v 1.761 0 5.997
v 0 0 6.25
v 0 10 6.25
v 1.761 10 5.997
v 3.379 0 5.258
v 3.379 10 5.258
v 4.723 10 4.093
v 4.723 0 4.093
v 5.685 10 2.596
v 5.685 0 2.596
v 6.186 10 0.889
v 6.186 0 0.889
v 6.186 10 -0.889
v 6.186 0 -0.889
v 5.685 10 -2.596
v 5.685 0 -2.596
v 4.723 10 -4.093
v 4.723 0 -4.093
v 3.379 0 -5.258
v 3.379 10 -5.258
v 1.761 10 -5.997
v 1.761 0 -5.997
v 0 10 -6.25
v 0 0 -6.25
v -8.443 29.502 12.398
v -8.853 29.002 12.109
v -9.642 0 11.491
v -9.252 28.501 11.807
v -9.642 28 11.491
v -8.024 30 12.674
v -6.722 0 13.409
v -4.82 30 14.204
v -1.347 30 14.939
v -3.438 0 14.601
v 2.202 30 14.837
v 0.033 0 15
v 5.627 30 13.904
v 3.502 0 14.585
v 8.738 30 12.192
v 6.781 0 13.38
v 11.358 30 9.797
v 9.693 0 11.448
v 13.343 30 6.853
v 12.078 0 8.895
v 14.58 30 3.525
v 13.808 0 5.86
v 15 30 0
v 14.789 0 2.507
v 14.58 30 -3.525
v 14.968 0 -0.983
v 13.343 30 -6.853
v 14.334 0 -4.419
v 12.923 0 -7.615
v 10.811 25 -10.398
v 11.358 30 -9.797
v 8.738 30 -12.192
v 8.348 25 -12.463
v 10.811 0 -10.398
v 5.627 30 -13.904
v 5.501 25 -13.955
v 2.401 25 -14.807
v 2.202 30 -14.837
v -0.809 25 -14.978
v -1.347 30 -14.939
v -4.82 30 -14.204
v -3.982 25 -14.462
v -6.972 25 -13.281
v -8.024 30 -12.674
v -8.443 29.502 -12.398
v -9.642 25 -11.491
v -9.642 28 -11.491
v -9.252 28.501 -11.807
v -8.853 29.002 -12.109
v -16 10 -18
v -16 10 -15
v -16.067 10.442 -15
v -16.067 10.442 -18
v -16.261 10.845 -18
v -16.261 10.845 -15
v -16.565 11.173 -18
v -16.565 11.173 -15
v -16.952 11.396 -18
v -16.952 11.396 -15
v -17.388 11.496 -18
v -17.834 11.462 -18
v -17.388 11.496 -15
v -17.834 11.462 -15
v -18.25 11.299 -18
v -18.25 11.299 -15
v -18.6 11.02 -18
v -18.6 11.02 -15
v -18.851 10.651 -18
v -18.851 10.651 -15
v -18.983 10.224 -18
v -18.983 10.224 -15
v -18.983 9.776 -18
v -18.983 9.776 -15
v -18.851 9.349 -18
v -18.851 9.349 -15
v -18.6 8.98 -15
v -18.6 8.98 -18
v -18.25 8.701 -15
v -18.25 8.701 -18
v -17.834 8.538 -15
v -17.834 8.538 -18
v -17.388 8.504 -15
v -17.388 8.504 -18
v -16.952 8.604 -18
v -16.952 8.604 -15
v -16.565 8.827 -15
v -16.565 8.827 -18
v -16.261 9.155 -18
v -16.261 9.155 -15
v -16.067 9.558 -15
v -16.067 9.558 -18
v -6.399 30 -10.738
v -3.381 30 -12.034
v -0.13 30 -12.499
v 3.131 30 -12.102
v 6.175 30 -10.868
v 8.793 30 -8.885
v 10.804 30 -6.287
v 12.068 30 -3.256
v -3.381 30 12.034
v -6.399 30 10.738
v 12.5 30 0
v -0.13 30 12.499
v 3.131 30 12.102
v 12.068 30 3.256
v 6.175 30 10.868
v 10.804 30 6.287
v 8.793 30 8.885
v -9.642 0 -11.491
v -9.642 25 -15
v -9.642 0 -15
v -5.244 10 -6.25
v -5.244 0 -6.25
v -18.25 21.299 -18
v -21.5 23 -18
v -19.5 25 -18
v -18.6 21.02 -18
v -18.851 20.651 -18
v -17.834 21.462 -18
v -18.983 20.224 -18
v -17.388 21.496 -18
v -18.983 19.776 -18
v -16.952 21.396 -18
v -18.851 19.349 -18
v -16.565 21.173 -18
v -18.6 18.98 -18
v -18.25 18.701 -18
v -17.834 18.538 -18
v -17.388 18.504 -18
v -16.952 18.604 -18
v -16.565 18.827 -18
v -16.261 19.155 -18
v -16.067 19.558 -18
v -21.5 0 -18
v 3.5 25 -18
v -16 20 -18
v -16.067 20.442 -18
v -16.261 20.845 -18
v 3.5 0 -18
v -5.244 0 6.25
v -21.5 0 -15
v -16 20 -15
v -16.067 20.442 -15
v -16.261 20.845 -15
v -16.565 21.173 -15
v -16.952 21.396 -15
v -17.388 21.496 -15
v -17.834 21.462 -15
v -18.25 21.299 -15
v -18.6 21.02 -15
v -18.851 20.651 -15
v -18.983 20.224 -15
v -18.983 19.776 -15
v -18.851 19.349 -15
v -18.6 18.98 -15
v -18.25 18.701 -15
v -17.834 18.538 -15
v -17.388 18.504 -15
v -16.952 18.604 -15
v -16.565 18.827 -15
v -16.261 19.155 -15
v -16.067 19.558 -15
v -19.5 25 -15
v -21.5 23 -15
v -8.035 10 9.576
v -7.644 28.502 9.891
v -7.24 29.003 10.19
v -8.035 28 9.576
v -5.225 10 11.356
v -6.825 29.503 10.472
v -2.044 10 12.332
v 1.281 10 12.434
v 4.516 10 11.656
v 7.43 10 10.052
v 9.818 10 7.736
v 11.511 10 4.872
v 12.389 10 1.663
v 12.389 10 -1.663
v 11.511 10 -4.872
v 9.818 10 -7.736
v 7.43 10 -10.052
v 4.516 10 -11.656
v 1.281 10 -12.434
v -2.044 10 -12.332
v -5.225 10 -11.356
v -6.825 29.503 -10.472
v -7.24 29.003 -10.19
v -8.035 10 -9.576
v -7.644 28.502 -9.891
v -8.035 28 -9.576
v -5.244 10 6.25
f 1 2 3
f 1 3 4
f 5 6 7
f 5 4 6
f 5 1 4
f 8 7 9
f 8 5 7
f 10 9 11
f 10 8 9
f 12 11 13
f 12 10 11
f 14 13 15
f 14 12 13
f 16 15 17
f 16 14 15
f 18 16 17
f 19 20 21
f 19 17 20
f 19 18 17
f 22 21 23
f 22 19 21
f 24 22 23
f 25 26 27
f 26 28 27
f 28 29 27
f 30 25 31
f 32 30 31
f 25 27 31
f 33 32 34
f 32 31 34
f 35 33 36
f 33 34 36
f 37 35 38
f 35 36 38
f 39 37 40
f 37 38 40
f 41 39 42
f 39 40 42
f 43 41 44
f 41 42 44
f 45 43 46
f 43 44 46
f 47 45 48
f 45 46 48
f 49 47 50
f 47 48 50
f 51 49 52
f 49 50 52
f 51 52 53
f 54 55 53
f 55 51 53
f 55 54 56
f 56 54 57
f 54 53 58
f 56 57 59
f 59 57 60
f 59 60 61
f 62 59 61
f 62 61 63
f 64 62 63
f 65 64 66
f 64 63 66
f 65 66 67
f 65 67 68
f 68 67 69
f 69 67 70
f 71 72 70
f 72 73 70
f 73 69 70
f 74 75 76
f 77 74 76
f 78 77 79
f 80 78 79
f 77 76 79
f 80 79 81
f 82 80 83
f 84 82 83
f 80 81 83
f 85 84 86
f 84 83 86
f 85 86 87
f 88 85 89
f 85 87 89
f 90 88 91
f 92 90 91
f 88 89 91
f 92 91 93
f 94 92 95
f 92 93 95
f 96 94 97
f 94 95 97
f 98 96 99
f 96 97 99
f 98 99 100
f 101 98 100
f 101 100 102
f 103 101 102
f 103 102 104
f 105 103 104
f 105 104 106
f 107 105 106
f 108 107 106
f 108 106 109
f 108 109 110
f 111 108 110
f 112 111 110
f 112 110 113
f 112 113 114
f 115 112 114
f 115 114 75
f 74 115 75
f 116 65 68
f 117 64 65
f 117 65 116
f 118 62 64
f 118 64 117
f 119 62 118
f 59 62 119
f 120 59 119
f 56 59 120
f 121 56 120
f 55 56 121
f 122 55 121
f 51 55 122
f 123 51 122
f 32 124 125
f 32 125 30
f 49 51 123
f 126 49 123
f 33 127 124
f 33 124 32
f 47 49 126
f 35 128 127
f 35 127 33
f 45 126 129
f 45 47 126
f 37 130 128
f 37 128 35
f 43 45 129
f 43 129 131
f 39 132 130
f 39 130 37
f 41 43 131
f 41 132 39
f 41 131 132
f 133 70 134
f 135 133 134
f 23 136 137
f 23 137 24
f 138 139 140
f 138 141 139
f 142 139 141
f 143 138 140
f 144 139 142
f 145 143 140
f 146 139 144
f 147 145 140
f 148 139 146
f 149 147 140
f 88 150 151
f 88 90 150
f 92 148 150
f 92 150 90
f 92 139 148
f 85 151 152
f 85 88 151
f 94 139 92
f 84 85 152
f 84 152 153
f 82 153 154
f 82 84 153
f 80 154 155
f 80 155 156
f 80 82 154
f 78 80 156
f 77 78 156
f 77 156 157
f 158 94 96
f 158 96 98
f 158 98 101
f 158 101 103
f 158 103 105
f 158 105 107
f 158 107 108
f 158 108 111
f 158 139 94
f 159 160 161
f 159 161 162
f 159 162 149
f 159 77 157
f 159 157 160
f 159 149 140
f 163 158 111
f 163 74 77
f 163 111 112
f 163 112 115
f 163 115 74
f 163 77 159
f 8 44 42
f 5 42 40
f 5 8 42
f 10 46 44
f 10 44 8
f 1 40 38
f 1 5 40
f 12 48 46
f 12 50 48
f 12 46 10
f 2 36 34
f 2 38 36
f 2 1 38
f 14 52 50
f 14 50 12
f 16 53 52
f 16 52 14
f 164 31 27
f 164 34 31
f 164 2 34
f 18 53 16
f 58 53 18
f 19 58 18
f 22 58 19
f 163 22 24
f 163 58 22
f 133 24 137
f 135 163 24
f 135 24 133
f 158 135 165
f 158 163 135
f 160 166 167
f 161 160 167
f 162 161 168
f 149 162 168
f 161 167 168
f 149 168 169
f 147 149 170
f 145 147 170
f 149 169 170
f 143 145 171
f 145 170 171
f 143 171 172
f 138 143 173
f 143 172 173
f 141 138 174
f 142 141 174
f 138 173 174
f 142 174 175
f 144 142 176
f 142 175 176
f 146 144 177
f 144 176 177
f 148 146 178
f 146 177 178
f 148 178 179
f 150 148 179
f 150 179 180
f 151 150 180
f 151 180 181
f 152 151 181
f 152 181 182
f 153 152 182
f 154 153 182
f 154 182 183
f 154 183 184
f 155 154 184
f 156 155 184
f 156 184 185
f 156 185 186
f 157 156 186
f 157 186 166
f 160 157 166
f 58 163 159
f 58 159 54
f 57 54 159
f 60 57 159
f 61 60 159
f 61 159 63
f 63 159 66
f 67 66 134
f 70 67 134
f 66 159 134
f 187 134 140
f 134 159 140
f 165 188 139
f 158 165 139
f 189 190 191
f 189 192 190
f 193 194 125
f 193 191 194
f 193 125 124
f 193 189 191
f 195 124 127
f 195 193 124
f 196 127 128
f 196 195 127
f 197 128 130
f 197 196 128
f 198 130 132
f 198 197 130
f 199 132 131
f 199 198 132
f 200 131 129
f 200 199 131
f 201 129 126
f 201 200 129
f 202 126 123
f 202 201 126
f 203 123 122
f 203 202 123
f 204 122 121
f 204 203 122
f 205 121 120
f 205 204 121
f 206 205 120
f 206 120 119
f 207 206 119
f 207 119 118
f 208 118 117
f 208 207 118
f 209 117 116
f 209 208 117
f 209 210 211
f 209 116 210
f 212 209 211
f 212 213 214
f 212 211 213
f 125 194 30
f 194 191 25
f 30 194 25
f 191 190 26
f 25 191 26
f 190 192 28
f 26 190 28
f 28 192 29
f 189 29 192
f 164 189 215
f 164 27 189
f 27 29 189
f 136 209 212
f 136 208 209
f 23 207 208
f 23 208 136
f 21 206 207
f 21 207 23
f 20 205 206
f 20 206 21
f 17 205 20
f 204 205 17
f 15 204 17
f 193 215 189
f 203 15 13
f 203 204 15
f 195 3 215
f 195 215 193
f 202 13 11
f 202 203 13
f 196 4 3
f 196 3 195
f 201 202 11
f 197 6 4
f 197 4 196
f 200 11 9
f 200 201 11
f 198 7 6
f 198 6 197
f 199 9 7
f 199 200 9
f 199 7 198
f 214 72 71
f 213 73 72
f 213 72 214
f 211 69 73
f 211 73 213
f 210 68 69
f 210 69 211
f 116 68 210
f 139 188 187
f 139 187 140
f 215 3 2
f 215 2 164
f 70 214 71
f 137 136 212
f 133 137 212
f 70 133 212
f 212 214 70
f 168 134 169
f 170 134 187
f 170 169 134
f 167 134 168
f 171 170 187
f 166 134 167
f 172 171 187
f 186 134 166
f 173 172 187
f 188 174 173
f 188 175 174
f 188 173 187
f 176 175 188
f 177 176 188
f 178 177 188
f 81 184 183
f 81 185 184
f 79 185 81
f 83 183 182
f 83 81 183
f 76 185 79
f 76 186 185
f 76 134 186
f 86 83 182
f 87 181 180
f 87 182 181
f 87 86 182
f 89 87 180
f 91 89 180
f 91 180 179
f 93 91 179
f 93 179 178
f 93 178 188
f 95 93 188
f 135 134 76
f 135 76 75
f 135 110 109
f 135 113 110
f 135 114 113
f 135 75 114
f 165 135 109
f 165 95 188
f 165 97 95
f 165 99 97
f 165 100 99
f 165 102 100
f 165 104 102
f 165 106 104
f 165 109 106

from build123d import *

# Parameters (mm, degrees)
SKETCH1_R           = 15
SKETCH1_R_2         = 6.25
BOSS_EXTRUDE1_DEPTH = 10
SKETCH2_R           = 15
SKETCH2_R_2         = 12.5
BOSS_EXTRUDE2_DEPTH = 20
CUT_EXTRUDE1_DEPTH  = 37.742346142
BOSS_EXTRUDE3_DEPTH = 25
SKETCH5_R           = 1.5
CUT_EXTRUDE2_DEPTH  = 48.563115962
CUT_EXTRUDE3_DEPTH  = 35.441980199
CHAMFER2_SIZE       = 2


with BuildPart() as part:
    # Sketch1 → Boss-Extrude1 (new body)
    with BuildSketch(Plane(origin=(0, 0, 0), x_dir=(1, 0, 0), z_dir=(0, 1, 0))):
        with Locations(Location((0, 0, 0), (0, 0, 270))):
            Circle(SKETCH1_R)
        with Locations(Location((0, 0, 0), (0, 0, 270))):
            Circle(SKETCH1_R_2, mode=Mode.SUBTRACT)
    extrude(amount=BOSS_EXTRUDE1_DEPTH)

    # Sketch2 → Boss-Extrude2 (add)
    with BuildSketch(Plane(origin=(0, 10, 0), x_dir=(1, 0, 0), z_dir=(0, 1, 0))):
        with Locations(Location((0, 0, 0), (0, 0, 270))):
            Circle(SKETCH2_R)
        with Locations(Location((0, 0, 0), (0, 0, 270))):
            Circle(SKETCH2_R_2, mode=Mode.SUBTRACT)
    extrude(amount=BOSS_EXTRUDE2_DEPTH)

    # Sketch3 → Cut-Extrude1 (cut, through all)
    with BuildSketch(Plane(origin=(0, 0, 0), x_dir=(1, 0, 0), z_dir=(0, 1, 0))):
        with BuildLine():
            Line((0, 0), (-9.641814145, 11.490666647))
            ThreePointArc((-9.641814145, 11.490666647), (-15, 0), (-9.641814145, -11.490666647))
            Line((-9.641814145, -11.490666647), (0, 0))
        make_face()
    extrude(amount=CUT_EXTRUDE1_DEPTH, mode=Mode.SUBTRACT)

    # Sketch4 → Boss-Extrude3 (add)
    with BuildSketch(Plane(origin=(0, 0, 0), x_dir=(1, 0, 0), z_dir=(0, 1, 0))):
        with BuildLine():
            Line((-9.641814145, 11.490666647), (-9.641814145, 15))
            Line((-9.641814145, 15), (-21.5, 15))
            Line((-21.5, 15), (-21.5, 18))
            Line((-21.5, 18), (3.5, 18))
            Line((3.5, 18), (10.811384743, 10.3977863))
            ThreePointArc((10.811384743, 10.3977863), (0.800356614, 14.978632424), (-9.641814145, 11.490666647))
        make_face()
    extrude(amount=BOSS_EXTRUDE3_DEPTH)

    # Sketch5 → Cut-Extrude2 (cut, through all)
    with BuildSketch(Plane.XY.offset(-15)):
        with Locations((-17.5, 20)):
            Circle(SKETCH5_R)
        with Locations((-17.5, 10)):
            Circle(SKETCH5_R)
    extrude(amount=-CUT_EXTRUDE2_DEPTH, mode=Mode.SUBTRACT)

    # Sketch6 → Cut-Extrude3 (cut, through all)
    with BuildSketch(Plane(origin=(0, 10, 0), x_dir=(1, 0, 0), z_dir=(0, 1, 0))):
        with BuildLine():
            Line((0, -6.25), (-12.5, -6.25))
            ThreePointArc((-12.5, -6.25), (-18.75, 0), (-12.5, 6.25))
            Line((-12.5, 6.25), (0, 6.25))
            ThreePointArc((0, 6.25), (6.25, 0), (0, -6.25))
        make_face()
    extrude(amount=-CUT_EXTRUDE3_DEPTH, mode=Mode.SUBTRACT)

    # Chamfer2
    chamfer2_edges = [part.edges().sort_by_distance(p)[0] for p in [
        (-8.838329633, 30, -10.533111093),
        (-8.838329633, 30, 10.533111093),
        (-21.5, 25, -16.5),
    ]]
    chamfer(chamfer2_edges, length=CHAMFER2_SIZE)


solid = part.part
